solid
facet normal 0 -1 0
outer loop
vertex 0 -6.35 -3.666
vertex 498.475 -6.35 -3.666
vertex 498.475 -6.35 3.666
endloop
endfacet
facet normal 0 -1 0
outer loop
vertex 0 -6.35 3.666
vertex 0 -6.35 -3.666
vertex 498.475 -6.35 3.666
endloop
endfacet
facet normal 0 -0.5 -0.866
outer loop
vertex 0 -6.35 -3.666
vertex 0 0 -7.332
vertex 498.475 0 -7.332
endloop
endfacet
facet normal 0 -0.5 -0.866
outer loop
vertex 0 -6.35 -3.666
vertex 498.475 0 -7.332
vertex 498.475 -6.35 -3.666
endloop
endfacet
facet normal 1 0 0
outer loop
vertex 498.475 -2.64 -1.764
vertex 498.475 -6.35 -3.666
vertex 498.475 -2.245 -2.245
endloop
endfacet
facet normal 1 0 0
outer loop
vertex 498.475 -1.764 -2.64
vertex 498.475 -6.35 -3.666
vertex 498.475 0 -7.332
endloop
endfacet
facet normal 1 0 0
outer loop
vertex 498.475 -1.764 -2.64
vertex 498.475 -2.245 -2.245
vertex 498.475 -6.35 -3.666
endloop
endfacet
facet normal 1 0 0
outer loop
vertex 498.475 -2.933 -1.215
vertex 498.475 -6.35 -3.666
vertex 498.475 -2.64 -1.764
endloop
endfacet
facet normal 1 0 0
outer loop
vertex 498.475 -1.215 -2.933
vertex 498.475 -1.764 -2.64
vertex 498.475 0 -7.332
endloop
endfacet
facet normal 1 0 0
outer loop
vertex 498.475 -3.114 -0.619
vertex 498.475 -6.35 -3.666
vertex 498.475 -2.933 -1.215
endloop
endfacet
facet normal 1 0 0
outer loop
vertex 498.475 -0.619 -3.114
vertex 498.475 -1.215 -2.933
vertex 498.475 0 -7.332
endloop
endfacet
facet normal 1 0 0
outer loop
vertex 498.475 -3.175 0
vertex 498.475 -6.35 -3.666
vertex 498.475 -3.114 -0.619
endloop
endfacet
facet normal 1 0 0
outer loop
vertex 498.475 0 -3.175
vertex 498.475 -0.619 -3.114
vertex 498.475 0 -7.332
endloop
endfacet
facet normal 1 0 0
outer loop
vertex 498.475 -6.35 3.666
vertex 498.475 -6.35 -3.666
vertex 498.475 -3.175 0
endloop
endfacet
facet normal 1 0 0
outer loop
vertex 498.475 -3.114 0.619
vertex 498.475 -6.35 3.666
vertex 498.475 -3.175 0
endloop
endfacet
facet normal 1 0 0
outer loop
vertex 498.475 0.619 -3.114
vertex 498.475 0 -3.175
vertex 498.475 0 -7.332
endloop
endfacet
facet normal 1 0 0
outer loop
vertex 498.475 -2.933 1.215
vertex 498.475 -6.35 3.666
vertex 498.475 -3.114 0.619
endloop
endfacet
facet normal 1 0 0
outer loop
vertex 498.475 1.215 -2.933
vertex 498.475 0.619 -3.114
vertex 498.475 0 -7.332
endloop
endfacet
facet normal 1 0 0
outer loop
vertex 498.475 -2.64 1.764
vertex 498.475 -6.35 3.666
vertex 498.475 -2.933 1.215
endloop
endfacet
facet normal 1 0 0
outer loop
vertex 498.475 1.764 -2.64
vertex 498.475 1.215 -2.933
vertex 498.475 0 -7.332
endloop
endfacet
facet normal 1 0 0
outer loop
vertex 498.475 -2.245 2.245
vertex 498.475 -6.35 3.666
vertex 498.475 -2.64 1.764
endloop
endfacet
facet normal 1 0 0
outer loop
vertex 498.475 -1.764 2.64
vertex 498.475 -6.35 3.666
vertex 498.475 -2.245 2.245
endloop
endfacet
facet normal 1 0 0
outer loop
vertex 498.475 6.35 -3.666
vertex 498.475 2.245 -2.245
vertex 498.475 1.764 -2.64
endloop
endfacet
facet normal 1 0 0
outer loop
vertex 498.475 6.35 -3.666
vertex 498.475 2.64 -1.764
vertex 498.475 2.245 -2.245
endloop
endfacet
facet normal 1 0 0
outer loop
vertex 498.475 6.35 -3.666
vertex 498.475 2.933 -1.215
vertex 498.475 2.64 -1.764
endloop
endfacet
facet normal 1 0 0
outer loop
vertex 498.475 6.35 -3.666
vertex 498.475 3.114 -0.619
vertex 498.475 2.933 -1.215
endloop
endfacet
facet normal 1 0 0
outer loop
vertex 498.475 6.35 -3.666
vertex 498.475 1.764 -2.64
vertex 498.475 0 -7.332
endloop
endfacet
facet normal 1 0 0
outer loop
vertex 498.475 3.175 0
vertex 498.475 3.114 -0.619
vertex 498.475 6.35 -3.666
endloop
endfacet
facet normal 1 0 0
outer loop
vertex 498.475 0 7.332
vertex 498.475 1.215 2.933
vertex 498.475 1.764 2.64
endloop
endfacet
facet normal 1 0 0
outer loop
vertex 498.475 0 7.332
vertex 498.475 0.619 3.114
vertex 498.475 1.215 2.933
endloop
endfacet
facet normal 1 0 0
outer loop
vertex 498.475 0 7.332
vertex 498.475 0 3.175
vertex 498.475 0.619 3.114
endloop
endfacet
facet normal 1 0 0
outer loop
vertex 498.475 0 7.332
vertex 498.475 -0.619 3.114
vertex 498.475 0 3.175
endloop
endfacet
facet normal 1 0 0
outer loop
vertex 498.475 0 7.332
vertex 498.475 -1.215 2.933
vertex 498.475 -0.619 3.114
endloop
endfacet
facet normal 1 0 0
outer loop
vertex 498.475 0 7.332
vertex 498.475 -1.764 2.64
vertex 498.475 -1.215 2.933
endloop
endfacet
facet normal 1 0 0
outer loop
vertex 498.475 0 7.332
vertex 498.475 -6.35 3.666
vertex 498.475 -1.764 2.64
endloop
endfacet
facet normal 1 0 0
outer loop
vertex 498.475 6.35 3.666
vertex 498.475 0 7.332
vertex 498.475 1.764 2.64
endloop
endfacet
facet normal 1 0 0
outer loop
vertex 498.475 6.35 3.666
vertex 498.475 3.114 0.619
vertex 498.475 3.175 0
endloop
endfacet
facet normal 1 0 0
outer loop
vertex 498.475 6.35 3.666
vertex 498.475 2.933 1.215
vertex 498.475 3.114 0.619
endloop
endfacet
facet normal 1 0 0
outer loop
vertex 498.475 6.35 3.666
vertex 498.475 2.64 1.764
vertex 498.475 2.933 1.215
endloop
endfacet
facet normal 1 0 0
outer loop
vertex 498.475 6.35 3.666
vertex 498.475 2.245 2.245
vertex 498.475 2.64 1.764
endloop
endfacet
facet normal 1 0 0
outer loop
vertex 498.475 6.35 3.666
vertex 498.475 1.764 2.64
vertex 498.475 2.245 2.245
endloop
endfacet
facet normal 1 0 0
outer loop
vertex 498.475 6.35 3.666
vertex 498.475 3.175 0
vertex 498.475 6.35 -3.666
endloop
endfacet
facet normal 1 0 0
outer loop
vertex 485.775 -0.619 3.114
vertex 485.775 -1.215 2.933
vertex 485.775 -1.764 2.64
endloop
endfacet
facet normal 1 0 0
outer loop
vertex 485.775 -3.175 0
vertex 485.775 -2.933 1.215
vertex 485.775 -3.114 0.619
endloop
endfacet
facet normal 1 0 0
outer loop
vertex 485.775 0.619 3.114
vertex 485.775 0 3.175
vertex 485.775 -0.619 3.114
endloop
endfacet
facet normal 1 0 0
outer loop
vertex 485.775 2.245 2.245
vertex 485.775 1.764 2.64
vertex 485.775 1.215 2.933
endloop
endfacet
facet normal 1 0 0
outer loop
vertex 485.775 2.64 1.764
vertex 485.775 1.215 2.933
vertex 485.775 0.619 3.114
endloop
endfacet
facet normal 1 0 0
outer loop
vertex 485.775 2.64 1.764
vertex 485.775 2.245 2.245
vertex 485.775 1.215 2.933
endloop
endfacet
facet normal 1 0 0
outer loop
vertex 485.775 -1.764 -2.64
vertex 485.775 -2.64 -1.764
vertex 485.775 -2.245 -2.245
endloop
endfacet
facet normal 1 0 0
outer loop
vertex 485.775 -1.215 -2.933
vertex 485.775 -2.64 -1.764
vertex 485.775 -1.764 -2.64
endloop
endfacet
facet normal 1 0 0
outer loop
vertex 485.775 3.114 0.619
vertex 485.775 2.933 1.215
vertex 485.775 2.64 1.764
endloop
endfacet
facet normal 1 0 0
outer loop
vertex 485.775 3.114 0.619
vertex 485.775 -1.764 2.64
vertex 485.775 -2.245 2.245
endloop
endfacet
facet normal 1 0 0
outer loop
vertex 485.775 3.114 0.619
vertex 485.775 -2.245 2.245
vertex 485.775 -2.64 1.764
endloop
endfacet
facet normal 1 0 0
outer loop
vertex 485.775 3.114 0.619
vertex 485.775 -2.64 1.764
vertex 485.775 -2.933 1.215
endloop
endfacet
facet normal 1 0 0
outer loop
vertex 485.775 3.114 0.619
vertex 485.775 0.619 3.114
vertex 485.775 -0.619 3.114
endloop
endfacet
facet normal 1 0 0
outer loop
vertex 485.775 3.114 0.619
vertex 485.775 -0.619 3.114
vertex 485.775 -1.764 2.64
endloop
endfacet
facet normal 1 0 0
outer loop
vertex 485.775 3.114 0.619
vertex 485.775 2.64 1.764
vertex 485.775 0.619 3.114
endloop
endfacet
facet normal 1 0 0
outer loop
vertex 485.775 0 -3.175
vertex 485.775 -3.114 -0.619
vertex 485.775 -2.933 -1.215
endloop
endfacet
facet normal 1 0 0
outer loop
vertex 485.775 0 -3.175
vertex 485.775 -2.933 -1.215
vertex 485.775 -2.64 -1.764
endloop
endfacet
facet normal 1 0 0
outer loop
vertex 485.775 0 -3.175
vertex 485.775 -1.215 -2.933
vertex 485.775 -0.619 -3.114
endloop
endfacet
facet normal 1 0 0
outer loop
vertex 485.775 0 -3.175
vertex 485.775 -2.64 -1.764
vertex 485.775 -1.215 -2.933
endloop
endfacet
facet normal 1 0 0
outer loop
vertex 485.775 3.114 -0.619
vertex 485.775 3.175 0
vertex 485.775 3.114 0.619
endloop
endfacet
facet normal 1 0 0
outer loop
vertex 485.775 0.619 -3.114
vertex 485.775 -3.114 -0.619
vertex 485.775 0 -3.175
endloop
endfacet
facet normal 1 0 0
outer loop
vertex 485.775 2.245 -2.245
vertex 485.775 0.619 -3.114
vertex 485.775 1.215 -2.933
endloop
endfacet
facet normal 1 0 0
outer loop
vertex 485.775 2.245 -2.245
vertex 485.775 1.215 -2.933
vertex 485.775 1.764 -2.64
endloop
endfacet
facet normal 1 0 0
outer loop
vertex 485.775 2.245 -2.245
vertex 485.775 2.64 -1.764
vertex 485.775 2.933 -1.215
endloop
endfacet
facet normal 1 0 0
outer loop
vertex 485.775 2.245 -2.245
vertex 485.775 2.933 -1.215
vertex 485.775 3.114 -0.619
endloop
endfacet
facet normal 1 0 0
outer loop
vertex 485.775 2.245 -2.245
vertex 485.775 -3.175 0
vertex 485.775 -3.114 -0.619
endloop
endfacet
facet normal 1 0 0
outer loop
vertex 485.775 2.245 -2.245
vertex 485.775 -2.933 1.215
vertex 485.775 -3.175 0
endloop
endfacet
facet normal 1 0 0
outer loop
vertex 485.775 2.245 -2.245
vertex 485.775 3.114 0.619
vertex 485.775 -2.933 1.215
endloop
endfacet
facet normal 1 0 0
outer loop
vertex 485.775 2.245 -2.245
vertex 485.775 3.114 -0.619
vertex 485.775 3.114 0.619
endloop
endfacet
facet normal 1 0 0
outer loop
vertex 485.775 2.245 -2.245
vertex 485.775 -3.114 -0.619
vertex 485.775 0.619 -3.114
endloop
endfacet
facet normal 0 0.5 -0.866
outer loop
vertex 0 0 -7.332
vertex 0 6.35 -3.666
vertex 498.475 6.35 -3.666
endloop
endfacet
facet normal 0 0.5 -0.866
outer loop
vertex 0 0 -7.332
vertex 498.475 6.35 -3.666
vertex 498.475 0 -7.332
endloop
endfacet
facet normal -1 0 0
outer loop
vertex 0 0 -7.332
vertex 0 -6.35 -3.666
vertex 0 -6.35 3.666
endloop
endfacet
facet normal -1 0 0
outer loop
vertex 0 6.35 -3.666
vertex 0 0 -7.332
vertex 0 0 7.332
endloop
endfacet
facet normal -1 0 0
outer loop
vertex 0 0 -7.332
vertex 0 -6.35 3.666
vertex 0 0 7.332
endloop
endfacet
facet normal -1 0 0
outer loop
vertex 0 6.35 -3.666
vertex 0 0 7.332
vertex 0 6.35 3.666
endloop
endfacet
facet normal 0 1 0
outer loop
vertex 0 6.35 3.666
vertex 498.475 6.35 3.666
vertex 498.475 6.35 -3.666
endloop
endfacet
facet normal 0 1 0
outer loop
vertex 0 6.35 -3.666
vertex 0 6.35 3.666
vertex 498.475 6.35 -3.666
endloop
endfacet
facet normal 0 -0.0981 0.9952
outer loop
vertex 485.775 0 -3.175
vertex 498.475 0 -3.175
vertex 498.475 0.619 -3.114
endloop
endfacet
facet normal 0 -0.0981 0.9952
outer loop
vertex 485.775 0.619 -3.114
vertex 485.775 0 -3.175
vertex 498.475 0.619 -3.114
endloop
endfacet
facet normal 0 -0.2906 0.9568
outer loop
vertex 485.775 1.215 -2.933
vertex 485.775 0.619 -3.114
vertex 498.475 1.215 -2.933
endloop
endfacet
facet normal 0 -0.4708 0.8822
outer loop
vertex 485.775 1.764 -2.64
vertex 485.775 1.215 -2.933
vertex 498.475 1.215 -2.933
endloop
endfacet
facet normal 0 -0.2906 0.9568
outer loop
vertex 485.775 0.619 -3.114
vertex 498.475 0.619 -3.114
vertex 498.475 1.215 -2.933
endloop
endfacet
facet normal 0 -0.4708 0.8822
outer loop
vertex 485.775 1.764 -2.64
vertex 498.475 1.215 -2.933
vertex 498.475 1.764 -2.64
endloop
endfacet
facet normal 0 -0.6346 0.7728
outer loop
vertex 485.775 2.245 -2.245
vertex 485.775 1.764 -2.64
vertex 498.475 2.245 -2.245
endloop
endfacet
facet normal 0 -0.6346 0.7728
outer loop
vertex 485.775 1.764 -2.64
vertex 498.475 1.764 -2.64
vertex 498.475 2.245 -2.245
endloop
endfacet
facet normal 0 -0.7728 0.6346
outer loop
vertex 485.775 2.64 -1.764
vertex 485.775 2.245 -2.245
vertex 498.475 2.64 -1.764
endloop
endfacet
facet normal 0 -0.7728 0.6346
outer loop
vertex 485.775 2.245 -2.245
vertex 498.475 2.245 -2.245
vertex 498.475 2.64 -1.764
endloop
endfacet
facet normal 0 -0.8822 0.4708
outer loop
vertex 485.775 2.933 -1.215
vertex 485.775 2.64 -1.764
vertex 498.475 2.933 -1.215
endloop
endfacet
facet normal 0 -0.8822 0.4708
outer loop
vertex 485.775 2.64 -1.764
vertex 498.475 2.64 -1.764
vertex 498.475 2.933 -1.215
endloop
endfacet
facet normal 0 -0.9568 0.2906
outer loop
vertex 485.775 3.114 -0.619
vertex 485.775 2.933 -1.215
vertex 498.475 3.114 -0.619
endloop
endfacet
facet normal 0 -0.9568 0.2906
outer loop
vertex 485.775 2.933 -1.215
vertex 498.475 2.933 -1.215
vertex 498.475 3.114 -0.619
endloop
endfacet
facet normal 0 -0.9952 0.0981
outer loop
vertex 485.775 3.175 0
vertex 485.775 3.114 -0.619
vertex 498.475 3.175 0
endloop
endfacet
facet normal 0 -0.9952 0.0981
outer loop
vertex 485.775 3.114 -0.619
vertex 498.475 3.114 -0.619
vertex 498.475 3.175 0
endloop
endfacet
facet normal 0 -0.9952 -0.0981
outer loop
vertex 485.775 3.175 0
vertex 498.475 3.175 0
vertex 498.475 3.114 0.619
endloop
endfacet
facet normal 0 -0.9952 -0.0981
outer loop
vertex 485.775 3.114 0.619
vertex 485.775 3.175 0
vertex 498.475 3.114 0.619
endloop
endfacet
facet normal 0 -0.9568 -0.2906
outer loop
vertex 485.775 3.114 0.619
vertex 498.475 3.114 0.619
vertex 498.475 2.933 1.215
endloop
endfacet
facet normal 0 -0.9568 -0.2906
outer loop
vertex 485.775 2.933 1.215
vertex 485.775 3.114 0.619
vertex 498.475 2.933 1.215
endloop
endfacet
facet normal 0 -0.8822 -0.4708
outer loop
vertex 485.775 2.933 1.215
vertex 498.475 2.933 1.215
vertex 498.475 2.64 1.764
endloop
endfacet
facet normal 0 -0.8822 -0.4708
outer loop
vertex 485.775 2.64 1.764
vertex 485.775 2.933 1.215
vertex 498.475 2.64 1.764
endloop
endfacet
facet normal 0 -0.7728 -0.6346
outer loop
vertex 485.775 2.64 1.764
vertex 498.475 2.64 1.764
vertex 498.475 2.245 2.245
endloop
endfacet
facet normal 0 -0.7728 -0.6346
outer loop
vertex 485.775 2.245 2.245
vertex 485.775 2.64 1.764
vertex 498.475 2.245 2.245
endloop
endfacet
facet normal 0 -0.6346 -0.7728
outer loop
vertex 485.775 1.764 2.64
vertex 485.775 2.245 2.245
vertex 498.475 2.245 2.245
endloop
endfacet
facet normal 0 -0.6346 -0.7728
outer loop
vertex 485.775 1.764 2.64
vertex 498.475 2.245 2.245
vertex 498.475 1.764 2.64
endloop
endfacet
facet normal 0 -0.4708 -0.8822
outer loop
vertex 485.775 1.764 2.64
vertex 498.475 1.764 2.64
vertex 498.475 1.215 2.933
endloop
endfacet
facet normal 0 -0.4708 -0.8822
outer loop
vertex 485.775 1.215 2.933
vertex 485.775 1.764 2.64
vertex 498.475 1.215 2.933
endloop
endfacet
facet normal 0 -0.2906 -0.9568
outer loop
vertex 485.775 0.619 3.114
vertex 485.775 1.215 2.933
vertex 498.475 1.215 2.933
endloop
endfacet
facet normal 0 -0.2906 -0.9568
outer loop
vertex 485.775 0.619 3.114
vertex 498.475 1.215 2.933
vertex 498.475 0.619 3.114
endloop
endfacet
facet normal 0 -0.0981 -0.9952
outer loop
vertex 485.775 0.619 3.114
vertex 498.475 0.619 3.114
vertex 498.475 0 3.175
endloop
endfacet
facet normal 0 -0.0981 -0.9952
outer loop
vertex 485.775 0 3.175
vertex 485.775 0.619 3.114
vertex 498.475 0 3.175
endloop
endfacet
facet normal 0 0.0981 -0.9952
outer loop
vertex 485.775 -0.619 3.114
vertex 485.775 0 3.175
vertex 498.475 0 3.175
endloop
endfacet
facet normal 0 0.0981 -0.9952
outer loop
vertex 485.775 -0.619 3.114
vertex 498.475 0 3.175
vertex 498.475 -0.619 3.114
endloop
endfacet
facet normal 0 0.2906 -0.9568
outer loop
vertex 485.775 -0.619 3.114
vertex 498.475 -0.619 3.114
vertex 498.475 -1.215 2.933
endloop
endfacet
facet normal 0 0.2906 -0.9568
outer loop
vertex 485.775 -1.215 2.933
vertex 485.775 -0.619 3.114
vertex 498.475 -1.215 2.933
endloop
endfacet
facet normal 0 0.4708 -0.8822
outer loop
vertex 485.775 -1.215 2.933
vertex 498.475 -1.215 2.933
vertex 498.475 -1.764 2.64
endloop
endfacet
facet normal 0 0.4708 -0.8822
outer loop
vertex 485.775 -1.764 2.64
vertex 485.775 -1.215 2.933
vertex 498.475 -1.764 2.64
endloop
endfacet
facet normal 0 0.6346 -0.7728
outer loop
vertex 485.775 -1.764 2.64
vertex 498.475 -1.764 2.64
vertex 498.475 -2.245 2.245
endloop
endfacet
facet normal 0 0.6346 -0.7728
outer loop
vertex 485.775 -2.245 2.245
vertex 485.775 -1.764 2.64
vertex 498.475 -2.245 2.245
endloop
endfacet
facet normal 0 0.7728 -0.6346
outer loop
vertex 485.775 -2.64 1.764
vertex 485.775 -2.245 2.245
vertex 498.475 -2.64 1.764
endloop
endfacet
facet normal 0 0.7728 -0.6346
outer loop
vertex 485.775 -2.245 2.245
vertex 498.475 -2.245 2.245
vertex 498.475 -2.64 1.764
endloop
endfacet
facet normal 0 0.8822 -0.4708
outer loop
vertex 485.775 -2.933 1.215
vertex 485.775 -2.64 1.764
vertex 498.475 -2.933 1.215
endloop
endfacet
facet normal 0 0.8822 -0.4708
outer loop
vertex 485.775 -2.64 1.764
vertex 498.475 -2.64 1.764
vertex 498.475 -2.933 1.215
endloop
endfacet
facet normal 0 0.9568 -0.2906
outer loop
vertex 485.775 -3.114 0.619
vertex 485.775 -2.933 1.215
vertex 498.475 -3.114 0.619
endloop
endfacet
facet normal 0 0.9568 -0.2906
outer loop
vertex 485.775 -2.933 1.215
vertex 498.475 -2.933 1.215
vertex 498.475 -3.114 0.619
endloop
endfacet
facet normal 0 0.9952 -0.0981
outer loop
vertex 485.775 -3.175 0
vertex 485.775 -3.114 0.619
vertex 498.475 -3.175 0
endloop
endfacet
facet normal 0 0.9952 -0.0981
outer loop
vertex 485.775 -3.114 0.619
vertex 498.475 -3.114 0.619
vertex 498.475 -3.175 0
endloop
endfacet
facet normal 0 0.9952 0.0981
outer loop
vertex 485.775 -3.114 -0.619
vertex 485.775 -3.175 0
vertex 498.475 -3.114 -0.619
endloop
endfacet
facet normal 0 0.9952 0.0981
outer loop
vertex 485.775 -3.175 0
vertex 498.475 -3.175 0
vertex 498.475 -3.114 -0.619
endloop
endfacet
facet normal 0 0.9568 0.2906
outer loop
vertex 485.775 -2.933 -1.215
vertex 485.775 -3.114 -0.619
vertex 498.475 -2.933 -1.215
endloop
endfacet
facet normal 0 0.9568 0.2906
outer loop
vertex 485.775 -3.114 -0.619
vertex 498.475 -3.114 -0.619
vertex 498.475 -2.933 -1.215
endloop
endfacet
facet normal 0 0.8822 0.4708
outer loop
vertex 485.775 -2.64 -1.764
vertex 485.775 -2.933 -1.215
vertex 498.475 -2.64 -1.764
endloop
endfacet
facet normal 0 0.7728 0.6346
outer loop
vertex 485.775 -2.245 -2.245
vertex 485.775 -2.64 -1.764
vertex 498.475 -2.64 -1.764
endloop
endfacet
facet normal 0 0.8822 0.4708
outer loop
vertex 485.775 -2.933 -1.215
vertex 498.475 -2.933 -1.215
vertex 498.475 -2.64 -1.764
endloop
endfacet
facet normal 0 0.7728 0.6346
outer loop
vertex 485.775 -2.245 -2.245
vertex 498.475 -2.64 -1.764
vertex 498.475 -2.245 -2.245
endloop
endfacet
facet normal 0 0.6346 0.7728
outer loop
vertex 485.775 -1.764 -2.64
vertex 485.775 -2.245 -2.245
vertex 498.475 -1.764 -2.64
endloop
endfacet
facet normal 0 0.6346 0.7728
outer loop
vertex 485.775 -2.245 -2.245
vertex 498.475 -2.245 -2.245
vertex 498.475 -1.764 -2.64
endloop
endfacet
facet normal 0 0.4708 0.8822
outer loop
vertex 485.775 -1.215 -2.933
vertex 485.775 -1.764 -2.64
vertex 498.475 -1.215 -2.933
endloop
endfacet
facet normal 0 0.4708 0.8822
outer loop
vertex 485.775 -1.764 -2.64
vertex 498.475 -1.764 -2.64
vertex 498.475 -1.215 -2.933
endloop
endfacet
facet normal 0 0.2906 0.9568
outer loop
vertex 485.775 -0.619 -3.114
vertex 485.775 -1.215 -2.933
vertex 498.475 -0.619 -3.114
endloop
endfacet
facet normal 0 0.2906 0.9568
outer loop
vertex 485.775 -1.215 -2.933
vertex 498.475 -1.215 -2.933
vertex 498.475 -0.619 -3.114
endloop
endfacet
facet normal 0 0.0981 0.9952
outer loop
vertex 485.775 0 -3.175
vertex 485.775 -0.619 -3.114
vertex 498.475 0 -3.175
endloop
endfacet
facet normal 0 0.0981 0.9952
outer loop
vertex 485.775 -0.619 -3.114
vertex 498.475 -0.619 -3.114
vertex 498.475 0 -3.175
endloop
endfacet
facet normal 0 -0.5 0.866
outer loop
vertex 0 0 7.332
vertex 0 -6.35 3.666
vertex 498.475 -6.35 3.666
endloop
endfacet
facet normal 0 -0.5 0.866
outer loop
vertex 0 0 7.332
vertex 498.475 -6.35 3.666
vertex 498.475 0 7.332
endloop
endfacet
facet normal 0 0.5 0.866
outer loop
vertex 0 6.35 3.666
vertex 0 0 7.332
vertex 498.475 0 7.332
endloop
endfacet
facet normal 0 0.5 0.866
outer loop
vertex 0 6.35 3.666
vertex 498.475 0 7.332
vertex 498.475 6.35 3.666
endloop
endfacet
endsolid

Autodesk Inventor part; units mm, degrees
ref_plane "YZ Plane" through (0, 0, 0) normal (1, 0, 0) x (0, 1, 0)
ref_plane "XZ Plane" through (0, 0, 0) normal (0, 1, 0) x (-1, 0, 0)
ref_plane "XY Plane" through (0, 0, 0) normal (0, 0, 1) x (1, 0, 0)
sketch "Sketch1" plane through (0, 0, 0) normal (1, 0, 0) x (0, 1, 0)
  line L0 (6.35, 3.6662) -> (6.35, -3.6662)
  line L1 (6.35, -3.6662) -> (0, -7.3323)
  line L2 (0, -7.3323) -> (-6.35, -3.6662)
  line L3 (-6.35, -3.6662) -> (-6.35, 3.6662)
  line L4 (-6.35, 3.6662) -> (0, 7.3323)
  line L5 (0, 7.3323) -> (6.35, 3.6662)
  point P0 (0, 0)
  dimension "d0" = 12.7
  dimension "d1" = 12.7
  dimension "d2" = 12.7
  dimension "d3" = 6.35
  dimension "d4" = 120
  dimension "d5" = 120
  dimension "d6" = 6.35
  dimension "d7" = 6.35
extrude "Extrusion1" add sketch "Sketch1" along normal blind 498.475
sketch "Sketch2" plane through (498.475, 0, 0) normal (1, 0, 0) x (0, 0, -1)
  circle A0 centre (0, 0) radius 3.175
  dimension "d10" = 6.35
extrude "Extrusion2" cut sketch "Sketch2" against normal blind 12.7
thread "Thread1" size "1/4-20 UNC" class "2B" standard "ANSI Unified Screw Threads" full length
properties part number "0.5 hex shaft" material "Steel, Alloy"
